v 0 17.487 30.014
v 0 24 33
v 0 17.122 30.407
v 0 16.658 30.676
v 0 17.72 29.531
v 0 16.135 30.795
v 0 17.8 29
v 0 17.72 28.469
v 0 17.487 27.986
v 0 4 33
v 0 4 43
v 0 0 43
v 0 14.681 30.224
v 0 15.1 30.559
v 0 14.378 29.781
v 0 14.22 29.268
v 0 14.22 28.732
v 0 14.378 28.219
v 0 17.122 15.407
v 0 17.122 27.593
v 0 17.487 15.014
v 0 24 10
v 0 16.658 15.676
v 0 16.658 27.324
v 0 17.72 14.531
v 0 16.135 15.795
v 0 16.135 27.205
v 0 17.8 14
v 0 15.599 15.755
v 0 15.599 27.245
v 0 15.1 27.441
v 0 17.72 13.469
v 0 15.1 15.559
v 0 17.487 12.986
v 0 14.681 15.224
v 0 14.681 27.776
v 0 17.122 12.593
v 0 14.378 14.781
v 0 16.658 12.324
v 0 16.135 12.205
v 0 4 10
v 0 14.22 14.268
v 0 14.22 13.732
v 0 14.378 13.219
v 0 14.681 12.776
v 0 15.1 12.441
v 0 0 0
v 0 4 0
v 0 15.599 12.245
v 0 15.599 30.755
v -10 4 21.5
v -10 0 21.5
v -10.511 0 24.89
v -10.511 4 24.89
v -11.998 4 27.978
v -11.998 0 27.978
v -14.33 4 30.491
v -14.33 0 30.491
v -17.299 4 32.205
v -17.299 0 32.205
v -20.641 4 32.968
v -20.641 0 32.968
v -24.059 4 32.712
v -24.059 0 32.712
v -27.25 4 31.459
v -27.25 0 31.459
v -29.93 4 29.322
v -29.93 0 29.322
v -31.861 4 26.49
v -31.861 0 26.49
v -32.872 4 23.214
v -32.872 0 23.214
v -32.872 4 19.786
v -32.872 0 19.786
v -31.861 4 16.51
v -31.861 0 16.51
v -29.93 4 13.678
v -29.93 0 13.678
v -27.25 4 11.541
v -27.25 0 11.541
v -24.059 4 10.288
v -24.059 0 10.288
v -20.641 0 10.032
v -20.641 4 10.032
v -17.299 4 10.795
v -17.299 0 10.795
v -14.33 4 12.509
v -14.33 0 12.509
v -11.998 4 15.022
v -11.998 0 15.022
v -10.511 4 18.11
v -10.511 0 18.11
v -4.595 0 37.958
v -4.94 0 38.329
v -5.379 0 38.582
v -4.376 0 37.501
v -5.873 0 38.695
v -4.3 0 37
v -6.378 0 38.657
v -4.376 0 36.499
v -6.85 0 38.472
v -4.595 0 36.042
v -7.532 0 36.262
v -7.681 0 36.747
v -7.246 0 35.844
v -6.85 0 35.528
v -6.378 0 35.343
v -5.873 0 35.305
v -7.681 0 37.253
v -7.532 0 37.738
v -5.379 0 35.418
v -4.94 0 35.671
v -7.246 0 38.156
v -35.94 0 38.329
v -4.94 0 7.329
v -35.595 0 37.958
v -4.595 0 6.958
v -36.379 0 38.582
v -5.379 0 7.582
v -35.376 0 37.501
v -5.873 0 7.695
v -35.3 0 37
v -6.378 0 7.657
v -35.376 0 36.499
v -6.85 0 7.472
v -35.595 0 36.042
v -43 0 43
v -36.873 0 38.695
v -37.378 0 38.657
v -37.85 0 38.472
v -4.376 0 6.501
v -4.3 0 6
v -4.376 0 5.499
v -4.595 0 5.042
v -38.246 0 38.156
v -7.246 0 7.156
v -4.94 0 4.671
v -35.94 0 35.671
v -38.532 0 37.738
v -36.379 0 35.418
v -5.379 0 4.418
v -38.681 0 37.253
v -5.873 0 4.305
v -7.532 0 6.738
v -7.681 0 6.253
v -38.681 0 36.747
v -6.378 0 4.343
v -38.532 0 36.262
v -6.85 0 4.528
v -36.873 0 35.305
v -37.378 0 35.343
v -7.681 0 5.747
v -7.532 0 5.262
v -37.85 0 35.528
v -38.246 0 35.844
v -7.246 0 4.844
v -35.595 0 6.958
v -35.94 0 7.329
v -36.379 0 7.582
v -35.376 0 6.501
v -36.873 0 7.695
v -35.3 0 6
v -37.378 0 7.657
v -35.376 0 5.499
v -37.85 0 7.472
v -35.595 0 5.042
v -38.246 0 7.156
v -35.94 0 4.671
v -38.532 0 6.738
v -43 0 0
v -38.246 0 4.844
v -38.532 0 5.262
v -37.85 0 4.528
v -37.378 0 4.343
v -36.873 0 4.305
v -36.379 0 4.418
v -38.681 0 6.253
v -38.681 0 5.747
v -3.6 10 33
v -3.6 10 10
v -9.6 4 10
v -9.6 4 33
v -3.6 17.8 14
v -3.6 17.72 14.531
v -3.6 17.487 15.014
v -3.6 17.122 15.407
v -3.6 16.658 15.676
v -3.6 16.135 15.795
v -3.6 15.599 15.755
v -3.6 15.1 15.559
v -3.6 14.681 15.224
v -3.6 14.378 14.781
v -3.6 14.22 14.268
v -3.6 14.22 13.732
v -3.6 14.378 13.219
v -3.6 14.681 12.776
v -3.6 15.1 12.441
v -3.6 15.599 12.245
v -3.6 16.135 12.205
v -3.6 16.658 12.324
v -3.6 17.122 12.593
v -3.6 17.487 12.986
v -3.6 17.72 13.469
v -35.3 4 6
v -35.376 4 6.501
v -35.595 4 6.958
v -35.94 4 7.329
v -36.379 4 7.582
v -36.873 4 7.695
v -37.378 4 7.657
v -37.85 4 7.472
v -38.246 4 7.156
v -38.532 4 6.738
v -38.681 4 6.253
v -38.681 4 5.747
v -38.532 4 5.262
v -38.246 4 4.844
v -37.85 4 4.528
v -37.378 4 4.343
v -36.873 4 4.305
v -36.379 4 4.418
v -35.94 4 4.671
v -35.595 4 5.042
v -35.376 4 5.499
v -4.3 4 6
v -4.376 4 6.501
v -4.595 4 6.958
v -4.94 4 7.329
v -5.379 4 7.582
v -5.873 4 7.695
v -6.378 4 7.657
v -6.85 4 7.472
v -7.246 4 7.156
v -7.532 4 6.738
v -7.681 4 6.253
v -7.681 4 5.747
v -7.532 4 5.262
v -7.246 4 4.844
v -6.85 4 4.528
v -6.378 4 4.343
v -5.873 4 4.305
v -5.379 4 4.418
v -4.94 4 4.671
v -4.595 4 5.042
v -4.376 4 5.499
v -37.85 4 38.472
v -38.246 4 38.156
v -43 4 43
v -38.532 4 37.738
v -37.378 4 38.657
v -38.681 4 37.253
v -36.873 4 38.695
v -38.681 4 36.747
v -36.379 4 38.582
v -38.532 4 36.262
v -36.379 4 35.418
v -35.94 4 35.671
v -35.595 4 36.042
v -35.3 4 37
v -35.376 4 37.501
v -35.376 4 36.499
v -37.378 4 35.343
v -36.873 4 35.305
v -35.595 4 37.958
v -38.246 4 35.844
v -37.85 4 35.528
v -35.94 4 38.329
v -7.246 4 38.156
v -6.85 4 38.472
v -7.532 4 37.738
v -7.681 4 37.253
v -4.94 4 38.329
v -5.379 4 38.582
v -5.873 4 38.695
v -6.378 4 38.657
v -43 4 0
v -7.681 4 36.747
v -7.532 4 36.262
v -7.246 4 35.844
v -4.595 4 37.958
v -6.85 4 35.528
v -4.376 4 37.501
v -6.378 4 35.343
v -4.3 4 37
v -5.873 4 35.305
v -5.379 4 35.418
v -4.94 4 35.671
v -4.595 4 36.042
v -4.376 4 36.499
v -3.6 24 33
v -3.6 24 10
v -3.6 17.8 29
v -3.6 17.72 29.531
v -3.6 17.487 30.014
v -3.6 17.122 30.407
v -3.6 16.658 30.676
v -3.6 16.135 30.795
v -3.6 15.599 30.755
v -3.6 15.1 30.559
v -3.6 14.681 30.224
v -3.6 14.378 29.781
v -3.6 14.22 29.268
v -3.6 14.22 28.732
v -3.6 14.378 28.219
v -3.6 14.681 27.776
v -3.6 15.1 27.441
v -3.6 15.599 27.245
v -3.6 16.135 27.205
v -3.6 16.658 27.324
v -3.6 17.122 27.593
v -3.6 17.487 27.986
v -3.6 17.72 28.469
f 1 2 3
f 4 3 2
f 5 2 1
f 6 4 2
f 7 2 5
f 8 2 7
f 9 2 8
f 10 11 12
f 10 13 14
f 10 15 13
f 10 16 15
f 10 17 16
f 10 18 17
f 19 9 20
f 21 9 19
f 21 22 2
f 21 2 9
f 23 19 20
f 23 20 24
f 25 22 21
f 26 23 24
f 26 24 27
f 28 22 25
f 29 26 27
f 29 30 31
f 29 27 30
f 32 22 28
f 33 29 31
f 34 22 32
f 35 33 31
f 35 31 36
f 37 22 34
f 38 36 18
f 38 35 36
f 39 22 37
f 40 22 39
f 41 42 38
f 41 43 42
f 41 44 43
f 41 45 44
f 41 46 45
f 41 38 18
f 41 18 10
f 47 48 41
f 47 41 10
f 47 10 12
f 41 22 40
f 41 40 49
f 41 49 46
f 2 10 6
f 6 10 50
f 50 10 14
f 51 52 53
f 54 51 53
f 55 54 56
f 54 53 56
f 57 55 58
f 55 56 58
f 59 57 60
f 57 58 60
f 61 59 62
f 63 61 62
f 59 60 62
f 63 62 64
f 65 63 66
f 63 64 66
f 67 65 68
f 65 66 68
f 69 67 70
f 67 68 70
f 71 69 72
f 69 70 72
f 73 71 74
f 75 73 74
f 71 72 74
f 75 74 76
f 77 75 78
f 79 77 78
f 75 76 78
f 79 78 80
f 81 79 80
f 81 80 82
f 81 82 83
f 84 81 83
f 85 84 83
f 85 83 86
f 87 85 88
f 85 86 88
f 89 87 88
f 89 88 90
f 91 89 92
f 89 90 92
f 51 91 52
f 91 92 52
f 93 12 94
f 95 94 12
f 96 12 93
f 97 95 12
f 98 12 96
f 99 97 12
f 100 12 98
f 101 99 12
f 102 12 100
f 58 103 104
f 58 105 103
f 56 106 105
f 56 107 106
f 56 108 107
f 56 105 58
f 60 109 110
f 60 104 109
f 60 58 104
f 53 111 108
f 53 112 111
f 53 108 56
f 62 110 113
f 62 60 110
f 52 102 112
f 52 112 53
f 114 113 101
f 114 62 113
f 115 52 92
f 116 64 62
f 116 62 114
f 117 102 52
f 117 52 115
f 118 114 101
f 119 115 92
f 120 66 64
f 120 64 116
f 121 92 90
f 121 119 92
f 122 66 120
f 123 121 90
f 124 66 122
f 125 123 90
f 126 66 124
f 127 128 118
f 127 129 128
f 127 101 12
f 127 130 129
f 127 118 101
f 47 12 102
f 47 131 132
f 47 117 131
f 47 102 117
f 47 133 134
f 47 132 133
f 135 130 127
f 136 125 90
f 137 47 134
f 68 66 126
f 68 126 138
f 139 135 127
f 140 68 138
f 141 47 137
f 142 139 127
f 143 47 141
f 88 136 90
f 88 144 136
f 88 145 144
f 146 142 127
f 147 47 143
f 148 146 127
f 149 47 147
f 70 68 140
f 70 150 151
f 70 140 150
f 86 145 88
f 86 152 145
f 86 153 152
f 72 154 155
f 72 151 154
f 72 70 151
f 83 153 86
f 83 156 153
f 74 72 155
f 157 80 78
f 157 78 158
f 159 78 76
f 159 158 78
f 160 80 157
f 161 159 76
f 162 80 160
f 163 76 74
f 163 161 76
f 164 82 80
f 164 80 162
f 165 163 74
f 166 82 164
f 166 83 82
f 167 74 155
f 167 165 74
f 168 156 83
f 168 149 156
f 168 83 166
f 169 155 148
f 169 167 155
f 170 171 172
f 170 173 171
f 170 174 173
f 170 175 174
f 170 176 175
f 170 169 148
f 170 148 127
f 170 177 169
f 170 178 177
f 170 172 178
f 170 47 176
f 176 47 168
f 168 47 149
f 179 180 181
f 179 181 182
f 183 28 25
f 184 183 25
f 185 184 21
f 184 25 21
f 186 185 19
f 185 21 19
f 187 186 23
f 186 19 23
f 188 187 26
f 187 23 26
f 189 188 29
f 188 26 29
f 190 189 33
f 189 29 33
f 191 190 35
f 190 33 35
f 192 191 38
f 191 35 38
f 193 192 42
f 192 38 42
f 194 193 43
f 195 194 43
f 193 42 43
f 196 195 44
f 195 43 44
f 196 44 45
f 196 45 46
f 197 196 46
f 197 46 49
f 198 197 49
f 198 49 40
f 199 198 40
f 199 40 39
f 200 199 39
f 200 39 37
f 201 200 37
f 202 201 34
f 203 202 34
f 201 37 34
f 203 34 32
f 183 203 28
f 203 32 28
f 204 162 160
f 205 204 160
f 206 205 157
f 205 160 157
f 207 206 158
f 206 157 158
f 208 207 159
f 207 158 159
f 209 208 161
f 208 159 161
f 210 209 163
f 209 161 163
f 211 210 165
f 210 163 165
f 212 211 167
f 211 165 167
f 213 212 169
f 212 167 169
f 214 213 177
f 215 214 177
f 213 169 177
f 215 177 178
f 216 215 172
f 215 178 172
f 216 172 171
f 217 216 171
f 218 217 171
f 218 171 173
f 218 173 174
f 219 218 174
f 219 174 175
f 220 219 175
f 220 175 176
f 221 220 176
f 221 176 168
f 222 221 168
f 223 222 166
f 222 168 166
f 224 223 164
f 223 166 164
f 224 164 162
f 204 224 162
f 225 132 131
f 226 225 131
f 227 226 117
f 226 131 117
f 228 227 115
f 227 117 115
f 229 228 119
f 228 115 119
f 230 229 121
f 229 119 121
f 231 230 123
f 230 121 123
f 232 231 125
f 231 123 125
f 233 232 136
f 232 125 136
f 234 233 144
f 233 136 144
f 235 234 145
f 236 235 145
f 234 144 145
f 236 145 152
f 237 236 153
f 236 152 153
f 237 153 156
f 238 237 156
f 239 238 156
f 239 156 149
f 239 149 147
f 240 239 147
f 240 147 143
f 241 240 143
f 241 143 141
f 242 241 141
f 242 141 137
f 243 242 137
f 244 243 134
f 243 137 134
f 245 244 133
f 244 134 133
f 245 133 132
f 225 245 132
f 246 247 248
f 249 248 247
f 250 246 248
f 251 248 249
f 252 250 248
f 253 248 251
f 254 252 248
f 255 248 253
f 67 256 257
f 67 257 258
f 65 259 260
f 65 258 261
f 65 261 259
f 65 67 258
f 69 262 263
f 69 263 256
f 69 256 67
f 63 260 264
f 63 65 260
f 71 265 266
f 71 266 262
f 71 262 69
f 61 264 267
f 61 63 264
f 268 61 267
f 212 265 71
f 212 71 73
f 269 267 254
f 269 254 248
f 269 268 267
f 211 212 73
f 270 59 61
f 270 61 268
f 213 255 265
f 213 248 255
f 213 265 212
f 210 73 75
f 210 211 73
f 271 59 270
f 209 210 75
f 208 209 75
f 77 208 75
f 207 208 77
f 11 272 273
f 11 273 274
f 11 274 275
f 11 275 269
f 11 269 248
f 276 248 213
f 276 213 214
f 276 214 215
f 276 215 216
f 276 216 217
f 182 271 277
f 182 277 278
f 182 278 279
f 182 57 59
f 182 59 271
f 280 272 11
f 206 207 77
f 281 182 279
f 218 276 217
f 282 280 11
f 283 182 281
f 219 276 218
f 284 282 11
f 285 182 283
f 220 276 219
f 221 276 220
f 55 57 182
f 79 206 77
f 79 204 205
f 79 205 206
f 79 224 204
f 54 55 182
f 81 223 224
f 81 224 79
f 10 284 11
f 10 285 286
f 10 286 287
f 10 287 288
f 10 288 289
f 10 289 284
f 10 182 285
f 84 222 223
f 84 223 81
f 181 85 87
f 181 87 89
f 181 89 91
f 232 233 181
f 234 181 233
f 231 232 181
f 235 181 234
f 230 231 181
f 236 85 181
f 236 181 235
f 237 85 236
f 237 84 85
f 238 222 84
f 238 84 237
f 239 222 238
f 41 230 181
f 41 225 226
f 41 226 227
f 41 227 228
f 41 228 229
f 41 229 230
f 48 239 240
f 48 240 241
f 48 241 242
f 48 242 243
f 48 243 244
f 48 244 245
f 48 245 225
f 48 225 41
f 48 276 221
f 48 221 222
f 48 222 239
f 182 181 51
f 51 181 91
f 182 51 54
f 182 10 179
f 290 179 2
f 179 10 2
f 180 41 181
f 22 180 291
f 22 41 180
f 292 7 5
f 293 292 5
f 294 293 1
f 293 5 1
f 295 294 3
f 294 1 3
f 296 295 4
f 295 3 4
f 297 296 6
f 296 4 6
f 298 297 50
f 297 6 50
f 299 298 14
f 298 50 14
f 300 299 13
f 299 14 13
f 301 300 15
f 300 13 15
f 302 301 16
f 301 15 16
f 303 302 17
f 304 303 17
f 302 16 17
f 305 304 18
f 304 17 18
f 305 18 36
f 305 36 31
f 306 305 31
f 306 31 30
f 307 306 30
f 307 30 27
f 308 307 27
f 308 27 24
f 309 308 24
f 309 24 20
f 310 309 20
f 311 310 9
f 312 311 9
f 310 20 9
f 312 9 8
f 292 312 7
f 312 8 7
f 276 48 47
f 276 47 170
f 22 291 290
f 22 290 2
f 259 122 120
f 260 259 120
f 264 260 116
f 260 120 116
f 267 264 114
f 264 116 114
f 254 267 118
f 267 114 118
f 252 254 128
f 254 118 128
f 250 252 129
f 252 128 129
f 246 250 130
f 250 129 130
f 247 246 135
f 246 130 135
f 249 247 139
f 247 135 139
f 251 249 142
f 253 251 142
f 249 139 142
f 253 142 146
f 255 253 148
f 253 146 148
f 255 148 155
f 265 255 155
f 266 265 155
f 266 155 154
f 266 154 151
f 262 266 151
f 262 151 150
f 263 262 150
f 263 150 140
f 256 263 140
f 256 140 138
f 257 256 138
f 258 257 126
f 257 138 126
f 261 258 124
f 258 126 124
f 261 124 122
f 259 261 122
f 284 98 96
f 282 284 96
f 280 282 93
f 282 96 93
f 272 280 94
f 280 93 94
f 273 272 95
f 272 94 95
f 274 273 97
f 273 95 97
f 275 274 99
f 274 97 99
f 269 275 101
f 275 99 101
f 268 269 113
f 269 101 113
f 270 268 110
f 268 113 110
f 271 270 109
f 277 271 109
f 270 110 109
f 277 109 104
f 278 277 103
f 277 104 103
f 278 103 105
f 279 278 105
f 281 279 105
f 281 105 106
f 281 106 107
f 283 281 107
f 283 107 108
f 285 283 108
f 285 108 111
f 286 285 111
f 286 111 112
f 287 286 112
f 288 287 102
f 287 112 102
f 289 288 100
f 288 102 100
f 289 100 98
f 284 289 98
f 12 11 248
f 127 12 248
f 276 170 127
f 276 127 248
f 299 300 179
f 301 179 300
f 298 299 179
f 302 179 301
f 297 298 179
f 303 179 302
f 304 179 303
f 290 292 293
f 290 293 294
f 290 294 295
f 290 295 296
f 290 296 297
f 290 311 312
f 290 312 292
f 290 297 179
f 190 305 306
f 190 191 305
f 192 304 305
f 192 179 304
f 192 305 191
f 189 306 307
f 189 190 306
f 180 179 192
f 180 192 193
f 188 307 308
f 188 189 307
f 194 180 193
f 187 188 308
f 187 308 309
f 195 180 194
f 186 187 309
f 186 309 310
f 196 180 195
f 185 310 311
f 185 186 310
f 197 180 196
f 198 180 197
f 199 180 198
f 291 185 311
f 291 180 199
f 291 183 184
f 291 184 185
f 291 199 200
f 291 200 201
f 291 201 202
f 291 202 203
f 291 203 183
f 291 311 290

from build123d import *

# Parameters (mm, degrees)
PAD003_DEPTH    = 43
SKETCH004_R     = 11.5
SKETCH004_R_2   = 1.7
POCKET_DEPTH    = 4
SKETCH005_R     = 1.8
SKETCH005_W     = 20
SKETCH005_H     = 10
POCKET001_DEPTH = 3.6
CHAMFER_SIZE    = 6


with BuildPart() as part:
    # Sketch003 → Pad003 (new body)
    with BuildSketch(Plane.XY):
        Polygon((-43, 4), (-3.6, 4), (-3.6, 24), (0, 24), (0, 0), (-43, 0), align=None)
    extrude(amount=PAD003_DEPTH)

    # Sketch004 → Pocket (cut)
    with BuildSketch(Plane.XZ):
        with Locations((-21.5, 21.5)):
            Circle(SKETCH004_R)
        with Locations((-37, 37)):
            Circle(SKETCH004_R_2)
        with Locations((-6, 37)):
            Circle(SKETCH004_R_2)
        with Locations((-6, 6)):
            Circle(SKETCH004_R_2)
        with Locations((-37, 6)):
            Circle(SKETCH004_R_2)
    extrude(amount=-POCKET_DEPTH, mode=Mode.SUBTRACT)

    # Sketch005 → Pocket001 (cut)
    with BuildSketch(Plane.YZ):
        with Locations((16, 29)):
            Circle(SKETCH005_R)
        with Locations((16, 14)):
            Circle(SKETCH005_R)
        with Locations((14, 38)):
            Rectangle(SKETCH005_W, SKETCH005_H)
        with Locations((14, 5)):
            Rectangle(SKETCH005_W, SKETCH005_H)
    extrude(amount=-POCKET001_DEPTH, mode=Mode.SUBTRACT)

    # Chamfer
    chamfer_edges = [part.edges().sort_by_distance(p)[0] for p in [
        (-3.6, 4, 21.5),
    ]]
    chamfer(chamfer_edges, length=CHAMFER_SIZE)


solid = part.part
